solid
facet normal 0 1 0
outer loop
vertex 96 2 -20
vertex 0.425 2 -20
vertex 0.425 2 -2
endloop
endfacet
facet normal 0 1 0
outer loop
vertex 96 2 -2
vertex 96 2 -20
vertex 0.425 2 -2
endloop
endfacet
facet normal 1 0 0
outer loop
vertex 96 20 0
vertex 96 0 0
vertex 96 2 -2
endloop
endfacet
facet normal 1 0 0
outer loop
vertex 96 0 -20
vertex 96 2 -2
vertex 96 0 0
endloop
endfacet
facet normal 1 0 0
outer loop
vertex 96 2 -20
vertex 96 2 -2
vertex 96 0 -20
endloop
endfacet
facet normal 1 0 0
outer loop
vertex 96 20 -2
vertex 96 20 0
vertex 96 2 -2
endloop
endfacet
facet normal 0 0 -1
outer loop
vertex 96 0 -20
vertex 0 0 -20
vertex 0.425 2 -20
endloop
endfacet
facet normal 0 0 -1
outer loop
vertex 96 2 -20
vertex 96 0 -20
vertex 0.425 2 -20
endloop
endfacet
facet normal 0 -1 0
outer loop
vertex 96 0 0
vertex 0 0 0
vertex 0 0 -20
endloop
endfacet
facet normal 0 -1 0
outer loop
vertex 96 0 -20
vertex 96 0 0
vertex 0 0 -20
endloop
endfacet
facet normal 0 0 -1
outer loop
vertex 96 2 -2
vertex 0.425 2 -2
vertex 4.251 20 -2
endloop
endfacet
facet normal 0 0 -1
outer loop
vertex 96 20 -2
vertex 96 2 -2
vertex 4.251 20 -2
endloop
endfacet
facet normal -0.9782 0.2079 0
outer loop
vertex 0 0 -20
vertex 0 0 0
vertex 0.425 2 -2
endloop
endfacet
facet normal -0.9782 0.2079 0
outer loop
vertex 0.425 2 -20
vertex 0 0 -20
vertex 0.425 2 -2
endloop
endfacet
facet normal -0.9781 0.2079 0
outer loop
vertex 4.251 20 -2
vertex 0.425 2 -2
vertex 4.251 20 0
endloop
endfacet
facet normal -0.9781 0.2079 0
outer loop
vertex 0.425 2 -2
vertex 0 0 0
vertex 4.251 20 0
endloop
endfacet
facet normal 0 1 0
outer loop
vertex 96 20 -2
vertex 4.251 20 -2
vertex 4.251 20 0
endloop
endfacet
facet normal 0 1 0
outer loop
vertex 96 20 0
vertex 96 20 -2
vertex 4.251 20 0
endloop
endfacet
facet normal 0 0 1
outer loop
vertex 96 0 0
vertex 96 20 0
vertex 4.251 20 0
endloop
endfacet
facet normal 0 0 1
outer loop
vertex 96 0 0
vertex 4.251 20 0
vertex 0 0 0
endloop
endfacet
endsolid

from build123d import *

# Parameters (mm, degrees)
BOSS_EXTRUDE1_DEPTH = 96
CUT_EXTRUDE1_DEPTH  = 101.079968026


with BuildPart() as part:
    # Sketch1 → Boss-Extrude1 (new body)
    with BuildSketch(Plane(origin=(0, 0, 0), x_dir=(0, 0, -1), z_dir=(1, 0, 0))):
        Polygon((0, 20), (0, 0), (20, 0), (20, 2), (2, 2), (2, 20), align=None)
    extrude(amount=BOSS_EXTRUDE1_DEPTH)

    # Sketch2 → Cut-Extrude1 (cut, through all)
    with BuildSketch(Plane.XY):
        Polygon((0, 0), (4.251131233, 20), (0, 20), align=None)
    extrude(amount=-CUT_EXTRUDE1_DEPTH, mode=Mode.SUBTRACT)


solid = part.part
